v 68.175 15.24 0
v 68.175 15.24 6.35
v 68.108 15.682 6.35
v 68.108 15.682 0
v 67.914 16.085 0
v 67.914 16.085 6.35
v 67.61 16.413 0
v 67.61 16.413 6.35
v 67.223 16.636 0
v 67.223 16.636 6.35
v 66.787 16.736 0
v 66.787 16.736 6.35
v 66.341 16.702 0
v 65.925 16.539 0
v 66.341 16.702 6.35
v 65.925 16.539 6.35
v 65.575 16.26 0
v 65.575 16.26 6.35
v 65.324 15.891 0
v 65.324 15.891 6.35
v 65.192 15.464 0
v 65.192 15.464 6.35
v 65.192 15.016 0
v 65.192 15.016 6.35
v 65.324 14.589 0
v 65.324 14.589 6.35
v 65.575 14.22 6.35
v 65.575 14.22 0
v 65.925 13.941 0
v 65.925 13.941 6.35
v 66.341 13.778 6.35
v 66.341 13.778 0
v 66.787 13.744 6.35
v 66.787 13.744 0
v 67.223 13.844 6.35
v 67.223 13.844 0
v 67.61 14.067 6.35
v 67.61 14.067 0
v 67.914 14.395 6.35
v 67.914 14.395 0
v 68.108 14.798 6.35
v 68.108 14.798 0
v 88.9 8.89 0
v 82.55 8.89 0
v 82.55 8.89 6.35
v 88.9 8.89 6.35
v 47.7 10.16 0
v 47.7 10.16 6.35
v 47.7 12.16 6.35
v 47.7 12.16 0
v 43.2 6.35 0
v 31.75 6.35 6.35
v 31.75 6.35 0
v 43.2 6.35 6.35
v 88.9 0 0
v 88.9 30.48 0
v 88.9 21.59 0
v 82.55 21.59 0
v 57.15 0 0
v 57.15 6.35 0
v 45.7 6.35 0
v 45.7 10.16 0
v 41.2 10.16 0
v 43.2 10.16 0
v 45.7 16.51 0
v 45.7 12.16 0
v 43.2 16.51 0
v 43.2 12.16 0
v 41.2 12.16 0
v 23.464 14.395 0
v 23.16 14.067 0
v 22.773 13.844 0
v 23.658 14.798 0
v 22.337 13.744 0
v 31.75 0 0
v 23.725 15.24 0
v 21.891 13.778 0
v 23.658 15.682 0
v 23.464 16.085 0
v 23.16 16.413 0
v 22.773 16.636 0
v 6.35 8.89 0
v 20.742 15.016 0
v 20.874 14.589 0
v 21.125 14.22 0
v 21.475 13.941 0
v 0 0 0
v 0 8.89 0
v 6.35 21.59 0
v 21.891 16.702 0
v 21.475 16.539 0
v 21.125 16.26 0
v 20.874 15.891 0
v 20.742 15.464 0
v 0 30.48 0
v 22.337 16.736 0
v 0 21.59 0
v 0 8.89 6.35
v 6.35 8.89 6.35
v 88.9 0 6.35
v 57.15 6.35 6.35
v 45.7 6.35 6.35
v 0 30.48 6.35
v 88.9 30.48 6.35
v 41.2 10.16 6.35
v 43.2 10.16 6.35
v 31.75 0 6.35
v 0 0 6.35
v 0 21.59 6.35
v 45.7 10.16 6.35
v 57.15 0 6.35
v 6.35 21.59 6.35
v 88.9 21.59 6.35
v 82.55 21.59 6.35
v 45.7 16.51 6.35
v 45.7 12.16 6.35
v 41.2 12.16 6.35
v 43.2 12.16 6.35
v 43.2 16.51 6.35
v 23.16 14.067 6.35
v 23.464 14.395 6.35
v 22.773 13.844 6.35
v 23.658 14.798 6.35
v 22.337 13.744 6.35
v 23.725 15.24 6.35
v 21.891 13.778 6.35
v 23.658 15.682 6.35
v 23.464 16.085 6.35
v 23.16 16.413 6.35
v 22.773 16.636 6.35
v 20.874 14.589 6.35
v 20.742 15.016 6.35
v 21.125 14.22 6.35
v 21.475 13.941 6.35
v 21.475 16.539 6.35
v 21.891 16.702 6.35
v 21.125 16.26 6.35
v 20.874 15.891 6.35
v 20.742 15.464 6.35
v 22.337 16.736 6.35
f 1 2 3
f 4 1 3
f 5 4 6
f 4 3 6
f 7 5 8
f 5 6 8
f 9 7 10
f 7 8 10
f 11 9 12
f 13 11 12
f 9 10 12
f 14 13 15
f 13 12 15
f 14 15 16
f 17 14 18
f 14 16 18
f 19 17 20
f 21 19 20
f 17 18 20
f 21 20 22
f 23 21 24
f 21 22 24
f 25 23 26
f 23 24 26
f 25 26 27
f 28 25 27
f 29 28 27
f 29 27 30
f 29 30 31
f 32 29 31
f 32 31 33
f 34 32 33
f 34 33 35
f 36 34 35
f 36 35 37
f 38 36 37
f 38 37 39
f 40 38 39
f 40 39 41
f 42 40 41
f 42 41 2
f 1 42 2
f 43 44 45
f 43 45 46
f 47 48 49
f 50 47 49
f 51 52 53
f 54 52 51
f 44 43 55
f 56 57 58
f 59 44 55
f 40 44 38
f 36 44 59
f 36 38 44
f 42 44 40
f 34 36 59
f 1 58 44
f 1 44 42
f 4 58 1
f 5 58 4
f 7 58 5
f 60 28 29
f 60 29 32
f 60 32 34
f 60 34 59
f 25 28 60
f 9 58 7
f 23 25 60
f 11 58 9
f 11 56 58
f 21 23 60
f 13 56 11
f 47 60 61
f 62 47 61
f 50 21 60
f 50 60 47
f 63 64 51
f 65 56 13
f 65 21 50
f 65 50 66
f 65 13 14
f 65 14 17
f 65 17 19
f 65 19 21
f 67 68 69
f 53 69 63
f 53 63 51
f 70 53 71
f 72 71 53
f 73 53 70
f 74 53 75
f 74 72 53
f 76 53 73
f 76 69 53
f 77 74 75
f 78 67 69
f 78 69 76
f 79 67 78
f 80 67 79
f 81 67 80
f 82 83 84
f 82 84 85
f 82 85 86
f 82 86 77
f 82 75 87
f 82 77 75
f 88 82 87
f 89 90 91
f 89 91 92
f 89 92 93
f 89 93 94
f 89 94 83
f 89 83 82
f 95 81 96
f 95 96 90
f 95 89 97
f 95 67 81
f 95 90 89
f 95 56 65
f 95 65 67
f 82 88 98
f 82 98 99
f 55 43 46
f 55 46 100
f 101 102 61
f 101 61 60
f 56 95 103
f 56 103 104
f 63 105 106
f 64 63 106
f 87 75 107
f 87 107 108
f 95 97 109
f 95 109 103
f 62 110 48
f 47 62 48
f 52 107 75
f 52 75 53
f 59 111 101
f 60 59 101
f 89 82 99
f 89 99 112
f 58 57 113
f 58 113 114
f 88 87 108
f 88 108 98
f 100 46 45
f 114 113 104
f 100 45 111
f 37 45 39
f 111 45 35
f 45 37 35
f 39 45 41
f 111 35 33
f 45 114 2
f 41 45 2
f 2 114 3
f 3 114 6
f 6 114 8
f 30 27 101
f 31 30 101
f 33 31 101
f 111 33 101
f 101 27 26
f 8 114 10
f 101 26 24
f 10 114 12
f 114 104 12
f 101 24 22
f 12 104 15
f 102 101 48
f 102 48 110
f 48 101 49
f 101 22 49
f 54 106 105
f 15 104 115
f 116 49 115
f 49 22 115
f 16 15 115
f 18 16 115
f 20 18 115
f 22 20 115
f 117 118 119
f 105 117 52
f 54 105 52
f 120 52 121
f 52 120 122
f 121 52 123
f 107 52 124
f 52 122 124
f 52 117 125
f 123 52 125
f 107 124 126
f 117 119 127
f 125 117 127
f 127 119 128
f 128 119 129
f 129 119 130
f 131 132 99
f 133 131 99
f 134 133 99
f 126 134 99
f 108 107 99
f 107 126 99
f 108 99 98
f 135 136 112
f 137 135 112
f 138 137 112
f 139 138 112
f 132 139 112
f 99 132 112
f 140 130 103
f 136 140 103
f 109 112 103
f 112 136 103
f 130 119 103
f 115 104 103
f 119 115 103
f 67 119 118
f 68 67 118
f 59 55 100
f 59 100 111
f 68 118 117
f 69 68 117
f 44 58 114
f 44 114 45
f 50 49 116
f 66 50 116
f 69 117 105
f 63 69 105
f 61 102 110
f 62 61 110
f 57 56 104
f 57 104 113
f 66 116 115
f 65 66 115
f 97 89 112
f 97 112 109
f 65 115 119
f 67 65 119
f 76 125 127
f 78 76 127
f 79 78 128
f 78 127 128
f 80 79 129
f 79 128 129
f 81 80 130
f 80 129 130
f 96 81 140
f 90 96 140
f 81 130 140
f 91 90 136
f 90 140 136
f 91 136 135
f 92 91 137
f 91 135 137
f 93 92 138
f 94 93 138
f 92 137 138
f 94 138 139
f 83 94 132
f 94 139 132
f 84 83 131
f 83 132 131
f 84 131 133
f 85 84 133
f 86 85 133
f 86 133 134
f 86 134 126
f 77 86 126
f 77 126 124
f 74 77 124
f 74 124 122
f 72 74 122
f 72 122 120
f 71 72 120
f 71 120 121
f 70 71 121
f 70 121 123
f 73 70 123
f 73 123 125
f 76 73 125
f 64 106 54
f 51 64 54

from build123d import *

# Parameters (mm, degrees)
BOSS_EXTRUDE1_DEPTH = 6.35
SKETCH2_R           = 1.5
SKETCH2_W           = 25.4
SKETCH2_H           = 6.35
CUT_EXTRUDE1_DEPTH  = 7.35
CUT_EXTRUDE2_DEPTH  = 7.35


with BuildPart() as part:
    # Sketch1 → Boss-Extrude1 (new body)
    with BuildSketch(Plane.XY):
        Polygon((0, 21.59), (0, 30.48), (88.9, 30.48), (88.9, 21.59), (82.55, 21.59), (82.55, 8.89), (88.9, 8.89), (88.9, 0), (0, 0), (0, 8.89), (6.35, 8.89), (6.35, 21.59), align=None)
    extrude(amount=BOSS_EXTRUDE1_DEPTH)

    # Sketch2 → Cut-Extrude1 (cut, through all)
    with BuildSketch(Plane.XY.offset(6.35)):
        with Locations((22.225, 15.24)):
            Circle(SKETCH2_R)
        with Locations((66.675, 15.24)):
            Circle(SKETCH2_R)
        with Locations((44.45, 3.175)):
            Rectangle(SKETCH2_W, SKETCH2_H)
    extrude(amount=-CUT_EXTRUDE1_DEPTH, mode=Mode.SUBTRACT)

    # Sketch3 → Cut-Extrude2 (cut, through all)
    with BuildSketch(Plane.XY.offset(6.35)):
        Polygon((43.2, 6.35), (45.7, 6.35), (45.7, 10.16), (47.7, 10.16), (47.7, 12.16), (45.7, 12.16), (45.7, 16.51), (43.2, 16.51), (43.2, 12.16), (41.2, 12.16), (41.2, 10.16), (43.2, 10.16), align=None)
    extrude(amount=-CUT_EXTRUDE2_DEPTH, mode=Mode.SUBTRACT)


solid = part.part
